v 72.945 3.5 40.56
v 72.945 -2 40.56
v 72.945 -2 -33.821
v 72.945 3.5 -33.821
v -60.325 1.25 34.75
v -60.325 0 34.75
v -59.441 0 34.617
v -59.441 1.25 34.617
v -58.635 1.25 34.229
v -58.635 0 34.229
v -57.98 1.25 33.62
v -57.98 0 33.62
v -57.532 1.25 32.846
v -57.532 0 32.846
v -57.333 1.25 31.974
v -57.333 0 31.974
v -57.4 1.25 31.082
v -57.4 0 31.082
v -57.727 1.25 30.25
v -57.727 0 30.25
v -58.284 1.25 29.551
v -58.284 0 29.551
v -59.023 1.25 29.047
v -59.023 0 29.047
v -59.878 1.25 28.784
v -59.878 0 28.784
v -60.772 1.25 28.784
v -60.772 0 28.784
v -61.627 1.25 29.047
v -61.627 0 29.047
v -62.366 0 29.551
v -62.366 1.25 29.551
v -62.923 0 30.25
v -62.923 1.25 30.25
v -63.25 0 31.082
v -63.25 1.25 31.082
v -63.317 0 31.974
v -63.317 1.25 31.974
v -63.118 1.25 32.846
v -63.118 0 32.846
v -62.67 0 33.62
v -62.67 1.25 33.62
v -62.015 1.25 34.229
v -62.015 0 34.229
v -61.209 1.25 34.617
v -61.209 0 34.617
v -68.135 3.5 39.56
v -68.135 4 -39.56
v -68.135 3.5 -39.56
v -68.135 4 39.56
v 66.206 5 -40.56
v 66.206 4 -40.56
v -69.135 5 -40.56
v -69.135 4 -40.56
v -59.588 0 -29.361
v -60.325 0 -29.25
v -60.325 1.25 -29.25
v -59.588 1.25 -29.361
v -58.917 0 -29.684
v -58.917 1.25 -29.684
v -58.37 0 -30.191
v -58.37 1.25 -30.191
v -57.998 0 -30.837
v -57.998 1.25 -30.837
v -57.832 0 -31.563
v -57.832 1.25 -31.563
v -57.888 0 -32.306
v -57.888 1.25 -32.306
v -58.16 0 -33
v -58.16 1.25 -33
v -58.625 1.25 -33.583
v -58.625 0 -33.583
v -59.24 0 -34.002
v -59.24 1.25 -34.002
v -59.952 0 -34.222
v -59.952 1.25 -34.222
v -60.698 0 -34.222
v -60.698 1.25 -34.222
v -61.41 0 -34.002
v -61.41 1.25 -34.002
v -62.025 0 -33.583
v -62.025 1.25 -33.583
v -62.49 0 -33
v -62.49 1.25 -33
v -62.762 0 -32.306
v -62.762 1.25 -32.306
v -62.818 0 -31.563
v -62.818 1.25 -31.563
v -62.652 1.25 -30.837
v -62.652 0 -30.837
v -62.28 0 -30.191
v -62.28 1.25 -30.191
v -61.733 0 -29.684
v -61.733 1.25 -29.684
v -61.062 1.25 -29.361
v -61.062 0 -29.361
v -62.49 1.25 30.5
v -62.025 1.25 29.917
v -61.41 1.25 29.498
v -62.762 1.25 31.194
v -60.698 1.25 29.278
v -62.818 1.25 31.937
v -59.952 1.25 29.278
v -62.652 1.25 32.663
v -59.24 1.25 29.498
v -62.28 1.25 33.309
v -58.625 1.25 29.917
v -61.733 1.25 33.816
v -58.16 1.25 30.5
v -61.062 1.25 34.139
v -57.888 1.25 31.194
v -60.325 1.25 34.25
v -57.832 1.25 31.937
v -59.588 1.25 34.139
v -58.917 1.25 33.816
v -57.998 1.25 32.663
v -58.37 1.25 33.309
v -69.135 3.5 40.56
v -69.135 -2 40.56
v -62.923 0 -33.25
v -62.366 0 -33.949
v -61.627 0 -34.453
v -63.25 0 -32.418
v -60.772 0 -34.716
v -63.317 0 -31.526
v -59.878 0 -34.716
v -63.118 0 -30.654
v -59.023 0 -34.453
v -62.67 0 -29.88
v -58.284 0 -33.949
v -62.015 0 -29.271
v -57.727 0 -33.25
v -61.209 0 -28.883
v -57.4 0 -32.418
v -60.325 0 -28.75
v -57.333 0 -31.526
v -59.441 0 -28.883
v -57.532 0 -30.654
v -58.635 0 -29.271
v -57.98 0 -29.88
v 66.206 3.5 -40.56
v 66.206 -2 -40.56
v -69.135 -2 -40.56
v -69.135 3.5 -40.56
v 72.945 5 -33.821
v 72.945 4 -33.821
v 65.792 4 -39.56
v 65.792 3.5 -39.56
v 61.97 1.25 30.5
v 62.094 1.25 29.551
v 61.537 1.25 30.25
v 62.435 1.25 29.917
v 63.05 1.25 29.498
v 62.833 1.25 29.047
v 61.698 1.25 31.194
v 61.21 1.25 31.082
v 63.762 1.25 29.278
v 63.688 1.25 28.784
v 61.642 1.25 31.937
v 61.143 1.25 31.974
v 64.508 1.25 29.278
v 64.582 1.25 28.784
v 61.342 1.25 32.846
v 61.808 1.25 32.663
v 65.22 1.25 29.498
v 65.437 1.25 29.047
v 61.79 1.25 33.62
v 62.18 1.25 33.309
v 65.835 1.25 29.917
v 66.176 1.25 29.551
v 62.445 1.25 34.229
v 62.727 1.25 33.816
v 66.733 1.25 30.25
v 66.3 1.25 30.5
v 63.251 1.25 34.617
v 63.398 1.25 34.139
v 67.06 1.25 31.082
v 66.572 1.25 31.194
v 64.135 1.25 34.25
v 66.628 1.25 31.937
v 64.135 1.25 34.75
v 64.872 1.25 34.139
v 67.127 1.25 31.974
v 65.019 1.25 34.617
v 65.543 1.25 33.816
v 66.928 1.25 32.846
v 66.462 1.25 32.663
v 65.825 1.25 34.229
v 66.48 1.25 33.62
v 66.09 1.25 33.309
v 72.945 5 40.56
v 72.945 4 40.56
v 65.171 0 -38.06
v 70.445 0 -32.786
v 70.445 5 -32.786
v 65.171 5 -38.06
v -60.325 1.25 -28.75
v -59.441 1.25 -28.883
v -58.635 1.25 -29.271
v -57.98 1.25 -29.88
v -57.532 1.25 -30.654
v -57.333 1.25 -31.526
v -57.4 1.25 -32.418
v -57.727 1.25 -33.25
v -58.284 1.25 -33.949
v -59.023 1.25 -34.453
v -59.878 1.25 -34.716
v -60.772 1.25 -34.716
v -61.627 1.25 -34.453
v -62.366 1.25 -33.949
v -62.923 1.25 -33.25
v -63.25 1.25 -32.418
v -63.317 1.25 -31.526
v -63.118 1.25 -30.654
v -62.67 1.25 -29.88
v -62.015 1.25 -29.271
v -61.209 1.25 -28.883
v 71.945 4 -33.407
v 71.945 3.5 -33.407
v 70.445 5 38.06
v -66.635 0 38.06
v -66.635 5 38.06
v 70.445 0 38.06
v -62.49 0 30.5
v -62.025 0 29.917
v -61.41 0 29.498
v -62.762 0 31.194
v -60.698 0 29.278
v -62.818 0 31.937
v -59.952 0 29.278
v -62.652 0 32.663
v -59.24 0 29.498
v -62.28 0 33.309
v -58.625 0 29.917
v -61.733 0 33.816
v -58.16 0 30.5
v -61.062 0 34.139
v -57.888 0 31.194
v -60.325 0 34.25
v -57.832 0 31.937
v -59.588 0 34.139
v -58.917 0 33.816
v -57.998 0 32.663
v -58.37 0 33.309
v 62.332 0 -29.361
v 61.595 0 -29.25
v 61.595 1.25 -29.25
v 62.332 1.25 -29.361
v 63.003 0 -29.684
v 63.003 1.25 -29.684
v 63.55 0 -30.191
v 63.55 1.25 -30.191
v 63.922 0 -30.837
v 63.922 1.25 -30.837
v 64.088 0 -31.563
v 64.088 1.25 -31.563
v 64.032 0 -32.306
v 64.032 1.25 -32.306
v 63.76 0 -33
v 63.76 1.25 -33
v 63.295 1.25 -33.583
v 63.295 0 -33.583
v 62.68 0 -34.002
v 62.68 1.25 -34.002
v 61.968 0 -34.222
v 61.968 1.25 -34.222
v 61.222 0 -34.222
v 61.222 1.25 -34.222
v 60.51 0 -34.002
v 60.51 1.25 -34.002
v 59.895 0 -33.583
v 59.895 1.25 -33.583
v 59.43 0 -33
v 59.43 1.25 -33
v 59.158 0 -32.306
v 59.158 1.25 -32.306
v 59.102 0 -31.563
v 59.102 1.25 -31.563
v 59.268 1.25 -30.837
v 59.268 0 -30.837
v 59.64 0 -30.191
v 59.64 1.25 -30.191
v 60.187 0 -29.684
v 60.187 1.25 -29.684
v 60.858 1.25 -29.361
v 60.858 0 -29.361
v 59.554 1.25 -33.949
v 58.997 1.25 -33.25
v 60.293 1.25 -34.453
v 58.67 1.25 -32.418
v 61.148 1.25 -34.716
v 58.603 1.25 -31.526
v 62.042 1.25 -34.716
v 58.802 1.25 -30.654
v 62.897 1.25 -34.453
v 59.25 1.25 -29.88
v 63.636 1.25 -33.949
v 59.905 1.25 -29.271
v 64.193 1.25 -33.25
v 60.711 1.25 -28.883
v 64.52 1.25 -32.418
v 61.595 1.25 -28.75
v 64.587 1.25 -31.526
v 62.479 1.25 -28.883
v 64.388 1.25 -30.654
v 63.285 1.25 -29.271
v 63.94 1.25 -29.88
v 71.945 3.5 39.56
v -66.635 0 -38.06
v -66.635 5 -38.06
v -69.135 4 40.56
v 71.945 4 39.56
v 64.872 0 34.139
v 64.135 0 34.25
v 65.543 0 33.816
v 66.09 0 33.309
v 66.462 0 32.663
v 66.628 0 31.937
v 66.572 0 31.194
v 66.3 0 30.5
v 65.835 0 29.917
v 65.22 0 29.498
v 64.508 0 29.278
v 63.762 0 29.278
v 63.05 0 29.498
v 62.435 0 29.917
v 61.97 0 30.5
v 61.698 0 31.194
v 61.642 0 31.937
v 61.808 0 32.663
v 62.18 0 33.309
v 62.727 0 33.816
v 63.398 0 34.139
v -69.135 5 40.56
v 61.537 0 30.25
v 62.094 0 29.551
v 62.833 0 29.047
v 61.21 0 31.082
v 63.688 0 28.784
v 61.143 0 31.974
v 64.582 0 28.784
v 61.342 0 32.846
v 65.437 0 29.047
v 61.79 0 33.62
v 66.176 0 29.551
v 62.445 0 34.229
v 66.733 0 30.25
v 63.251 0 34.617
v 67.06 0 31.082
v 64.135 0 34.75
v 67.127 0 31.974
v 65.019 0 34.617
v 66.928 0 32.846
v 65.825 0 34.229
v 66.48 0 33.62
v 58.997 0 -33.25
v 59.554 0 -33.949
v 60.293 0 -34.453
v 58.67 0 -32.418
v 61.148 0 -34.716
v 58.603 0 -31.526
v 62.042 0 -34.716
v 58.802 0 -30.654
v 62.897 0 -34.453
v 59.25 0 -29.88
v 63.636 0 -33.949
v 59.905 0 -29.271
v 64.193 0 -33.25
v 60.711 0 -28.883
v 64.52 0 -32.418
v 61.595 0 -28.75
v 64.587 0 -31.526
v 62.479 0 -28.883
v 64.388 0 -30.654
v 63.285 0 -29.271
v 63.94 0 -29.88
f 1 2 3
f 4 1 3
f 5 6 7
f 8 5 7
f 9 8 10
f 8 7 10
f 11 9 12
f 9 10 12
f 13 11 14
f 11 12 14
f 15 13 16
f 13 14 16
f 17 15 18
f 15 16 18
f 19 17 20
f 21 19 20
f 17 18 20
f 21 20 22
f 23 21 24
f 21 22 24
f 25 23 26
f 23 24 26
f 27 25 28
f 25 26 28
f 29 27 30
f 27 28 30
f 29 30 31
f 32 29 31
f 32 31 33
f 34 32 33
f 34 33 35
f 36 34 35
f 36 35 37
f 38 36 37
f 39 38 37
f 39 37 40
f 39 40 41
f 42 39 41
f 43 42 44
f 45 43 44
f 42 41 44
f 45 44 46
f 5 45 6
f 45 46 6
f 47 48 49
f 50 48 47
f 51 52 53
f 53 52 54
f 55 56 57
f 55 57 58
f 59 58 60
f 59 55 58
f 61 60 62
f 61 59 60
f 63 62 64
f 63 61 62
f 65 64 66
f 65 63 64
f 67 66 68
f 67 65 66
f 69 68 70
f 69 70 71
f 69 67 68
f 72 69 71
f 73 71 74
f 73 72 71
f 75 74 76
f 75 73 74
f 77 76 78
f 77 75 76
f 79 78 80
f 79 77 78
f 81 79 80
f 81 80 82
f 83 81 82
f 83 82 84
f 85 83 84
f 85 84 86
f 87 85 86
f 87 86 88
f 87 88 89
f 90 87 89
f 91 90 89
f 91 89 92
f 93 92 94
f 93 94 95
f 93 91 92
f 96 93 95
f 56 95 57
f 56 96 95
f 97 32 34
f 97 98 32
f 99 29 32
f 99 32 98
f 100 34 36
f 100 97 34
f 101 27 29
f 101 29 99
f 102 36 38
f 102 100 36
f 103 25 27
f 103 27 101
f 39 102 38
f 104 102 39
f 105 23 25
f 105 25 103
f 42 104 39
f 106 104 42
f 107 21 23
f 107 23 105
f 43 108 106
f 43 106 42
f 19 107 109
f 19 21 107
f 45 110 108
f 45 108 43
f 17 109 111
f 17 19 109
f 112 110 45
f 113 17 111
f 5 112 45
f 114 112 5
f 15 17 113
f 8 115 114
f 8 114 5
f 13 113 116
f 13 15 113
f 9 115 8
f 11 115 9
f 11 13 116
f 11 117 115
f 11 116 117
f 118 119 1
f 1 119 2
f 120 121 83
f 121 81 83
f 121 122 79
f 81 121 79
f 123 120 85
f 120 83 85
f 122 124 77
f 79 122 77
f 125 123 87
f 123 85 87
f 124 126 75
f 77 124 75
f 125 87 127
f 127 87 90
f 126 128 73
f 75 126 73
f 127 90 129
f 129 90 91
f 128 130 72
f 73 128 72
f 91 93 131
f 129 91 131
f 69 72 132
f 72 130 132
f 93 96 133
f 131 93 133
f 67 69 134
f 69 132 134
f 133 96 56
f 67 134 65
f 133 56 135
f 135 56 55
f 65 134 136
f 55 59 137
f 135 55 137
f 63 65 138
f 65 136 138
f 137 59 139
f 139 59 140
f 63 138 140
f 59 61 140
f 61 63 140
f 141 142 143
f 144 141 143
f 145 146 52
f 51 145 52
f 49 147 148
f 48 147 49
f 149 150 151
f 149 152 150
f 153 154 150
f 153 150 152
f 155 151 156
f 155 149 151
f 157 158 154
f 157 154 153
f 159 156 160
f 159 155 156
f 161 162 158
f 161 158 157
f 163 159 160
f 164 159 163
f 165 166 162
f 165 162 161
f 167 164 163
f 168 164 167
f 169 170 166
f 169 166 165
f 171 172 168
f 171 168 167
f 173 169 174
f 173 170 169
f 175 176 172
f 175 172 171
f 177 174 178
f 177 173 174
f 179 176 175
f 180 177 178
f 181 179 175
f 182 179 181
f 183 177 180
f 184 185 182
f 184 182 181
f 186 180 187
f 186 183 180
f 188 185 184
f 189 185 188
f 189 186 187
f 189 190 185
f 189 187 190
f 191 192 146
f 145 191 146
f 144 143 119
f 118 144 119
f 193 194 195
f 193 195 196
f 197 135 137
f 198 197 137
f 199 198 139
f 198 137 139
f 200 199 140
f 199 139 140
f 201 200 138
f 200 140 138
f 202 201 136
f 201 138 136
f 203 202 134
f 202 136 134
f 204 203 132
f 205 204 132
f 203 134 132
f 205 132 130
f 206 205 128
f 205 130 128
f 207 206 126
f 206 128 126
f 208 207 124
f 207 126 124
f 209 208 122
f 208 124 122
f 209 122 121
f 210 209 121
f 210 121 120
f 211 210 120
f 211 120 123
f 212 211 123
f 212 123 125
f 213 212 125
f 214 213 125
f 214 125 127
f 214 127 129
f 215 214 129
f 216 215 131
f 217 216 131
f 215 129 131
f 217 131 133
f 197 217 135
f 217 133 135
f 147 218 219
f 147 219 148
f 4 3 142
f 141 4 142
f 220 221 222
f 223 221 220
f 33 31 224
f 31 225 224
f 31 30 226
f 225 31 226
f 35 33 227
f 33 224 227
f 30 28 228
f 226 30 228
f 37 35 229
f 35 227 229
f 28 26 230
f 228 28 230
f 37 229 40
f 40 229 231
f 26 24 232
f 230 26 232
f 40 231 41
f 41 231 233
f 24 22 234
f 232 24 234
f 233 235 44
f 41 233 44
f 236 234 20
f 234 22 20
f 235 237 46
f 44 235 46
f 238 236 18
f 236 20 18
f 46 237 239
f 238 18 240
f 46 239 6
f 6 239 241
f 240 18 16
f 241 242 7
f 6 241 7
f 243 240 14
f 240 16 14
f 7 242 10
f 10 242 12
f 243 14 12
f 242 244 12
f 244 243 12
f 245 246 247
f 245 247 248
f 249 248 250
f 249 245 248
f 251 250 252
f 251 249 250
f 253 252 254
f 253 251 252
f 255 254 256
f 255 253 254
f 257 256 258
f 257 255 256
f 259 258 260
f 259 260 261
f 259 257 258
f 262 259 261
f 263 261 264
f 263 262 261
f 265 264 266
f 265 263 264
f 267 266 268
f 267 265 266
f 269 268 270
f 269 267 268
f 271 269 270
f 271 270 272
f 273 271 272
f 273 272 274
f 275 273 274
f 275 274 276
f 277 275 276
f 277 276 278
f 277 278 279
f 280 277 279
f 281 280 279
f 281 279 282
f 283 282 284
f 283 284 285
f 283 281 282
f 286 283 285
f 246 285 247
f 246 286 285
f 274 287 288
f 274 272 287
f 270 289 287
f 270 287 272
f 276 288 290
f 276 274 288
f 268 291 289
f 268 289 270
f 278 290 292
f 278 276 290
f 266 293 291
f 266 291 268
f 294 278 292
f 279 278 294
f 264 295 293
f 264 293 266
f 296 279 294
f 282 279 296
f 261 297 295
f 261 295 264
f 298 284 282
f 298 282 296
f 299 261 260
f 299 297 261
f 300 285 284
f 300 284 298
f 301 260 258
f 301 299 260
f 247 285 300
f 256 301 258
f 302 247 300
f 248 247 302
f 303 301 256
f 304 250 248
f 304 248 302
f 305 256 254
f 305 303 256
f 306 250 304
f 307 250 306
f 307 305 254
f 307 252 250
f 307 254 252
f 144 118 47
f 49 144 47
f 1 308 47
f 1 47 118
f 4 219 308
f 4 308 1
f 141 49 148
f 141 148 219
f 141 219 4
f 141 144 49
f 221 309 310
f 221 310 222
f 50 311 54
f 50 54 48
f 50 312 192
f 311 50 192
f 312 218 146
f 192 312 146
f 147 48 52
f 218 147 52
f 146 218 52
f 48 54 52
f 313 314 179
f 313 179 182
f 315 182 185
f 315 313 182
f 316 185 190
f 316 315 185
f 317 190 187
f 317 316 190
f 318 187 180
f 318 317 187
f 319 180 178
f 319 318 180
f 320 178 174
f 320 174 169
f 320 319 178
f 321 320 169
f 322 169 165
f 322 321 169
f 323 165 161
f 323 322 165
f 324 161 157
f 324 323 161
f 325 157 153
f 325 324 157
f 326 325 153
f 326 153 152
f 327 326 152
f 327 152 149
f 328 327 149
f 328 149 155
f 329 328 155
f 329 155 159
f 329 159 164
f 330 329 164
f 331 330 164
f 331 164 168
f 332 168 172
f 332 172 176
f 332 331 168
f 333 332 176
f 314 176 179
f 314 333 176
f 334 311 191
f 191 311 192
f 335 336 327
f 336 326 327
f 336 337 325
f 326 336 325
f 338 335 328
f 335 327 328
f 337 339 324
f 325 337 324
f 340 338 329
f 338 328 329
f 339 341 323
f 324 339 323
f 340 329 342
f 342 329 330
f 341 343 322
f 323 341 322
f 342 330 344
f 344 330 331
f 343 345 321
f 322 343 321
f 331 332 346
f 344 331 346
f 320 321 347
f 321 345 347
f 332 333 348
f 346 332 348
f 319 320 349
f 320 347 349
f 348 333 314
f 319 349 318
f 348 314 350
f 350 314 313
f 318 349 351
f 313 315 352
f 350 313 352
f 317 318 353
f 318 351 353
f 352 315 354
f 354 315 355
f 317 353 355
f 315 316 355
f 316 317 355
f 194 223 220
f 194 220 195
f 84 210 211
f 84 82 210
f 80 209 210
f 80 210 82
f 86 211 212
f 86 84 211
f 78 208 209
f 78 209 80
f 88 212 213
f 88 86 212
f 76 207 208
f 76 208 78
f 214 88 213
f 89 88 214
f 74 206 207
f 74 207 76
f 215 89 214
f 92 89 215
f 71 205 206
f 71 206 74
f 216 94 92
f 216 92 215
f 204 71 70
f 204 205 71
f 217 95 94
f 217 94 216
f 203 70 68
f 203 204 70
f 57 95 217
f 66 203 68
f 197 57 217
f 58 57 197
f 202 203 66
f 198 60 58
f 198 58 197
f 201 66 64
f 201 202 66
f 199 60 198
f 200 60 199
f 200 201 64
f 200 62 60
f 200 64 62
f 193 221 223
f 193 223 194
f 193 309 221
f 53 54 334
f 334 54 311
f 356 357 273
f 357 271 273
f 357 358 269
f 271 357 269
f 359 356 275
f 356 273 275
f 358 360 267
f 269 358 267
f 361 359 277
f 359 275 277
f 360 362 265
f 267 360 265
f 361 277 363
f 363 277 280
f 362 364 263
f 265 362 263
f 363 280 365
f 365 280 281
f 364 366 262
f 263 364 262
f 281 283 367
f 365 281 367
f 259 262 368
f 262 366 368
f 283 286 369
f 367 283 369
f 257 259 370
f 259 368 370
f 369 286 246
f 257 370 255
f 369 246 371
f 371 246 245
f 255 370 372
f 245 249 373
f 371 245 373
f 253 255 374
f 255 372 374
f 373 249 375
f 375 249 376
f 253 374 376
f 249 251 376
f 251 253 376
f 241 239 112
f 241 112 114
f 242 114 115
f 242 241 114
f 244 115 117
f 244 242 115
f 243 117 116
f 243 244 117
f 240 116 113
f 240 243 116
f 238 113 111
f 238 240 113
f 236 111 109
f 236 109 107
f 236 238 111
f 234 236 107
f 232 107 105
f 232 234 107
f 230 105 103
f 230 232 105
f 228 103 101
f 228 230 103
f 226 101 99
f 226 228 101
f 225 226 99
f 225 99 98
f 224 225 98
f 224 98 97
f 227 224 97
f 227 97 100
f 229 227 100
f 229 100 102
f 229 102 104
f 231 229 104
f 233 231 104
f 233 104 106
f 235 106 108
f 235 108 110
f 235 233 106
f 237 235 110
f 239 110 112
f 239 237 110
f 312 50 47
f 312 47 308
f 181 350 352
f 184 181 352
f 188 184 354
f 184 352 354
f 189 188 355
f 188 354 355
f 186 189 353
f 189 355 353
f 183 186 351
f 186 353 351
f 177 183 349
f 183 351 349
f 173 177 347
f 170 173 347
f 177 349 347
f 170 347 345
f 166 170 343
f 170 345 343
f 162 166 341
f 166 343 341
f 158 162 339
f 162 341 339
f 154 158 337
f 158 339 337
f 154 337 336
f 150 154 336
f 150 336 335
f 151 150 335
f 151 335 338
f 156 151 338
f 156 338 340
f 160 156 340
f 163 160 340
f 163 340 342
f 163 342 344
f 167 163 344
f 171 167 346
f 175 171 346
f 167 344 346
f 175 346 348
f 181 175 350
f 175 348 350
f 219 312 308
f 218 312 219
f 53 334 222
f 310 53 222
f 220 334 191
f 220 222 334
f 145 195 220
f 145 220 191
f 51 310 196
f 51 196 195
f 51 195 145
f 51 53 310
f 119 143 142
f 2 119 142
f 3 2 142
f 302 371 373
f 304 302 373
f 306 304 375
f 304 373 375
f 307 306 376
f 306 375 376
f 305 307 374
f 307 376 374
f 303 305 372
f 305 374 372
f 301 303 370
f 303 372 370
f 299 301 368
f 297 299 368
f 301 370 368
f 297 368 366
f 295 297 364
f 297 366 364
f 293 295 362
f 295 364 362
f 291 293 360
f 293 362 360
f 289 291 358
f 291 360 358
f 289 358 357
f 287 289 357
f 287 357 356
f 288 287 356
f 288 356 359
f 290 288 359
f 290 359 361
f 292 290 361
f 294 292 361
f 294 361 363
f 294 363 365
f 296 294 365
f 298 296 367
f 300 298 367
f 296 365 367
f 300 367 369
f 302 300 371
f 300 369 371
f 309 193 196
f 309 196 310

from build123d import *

# Parameters (mm, degrees)
BOSS_EXTRUDE1_DEPTH      = 5
BOSS_EXTRUDE1_DEPTH_BACK = 2
CUT_EXTRUDE1_DEPTH       = 5
SKETCH5_R                = 3
SKETCH5_R_2              = 2.5
BOSS_EXTRUDE2_DEPTH      = 1.25
BOSS_EXTRUDE2_2_DEPTH    = 1.25
BOSS_EXTRUDE2_3_DEPTH    = 1.25
BOSS_EXTRUDE2_4_DEPTH    = 1.25
CUT_EXTRUDE2_DEPTH       = 0.5


with BuildPart() as part:
    # Sketch3 → Boss-Extrude1 (new, two sides: drawn at the far end of the back side and taken through both)
    with BuildSketch(Plane(origin=(0, 0, 0), x_dir=(1, 0, 0), z_dir=(0, 1, 0)).offset(-BOSS_EXTRUDE1_DEPTH_BACK)):
        Polygon((72.945, 33.821067812), (66.206067812, 40.56), (-69.135, 40.56), (-69.135, -40.56), (72.945, -40.56), align=None)
    extrude(amount=BOSS_EXTRUDE1_DEPTH + BOSS_EXTRUDE1_DEPTH_BACK)

    # Sketch4 → Cut-Extrude1 (cut)
    with BuildSketch(Plane(origin=(0, 0, 0), x_dir=(1, 0, 0), z_dir=(0, 1, 0))):
        Polygon((-66.635, -38.06), (70.445, -38.06), (70.445, 32.785533906), (65.170533906, 38.06), (-66.635, 38.06), align=None)
    extrude(amount=CUT_EXTRUDE1_DEPTH, mode=Mode.SUBTRACT)

    # Sketch6 → Cut-Extrude2 (cut)
    with BuildSketch(Plane(origin=(0, 4, 0), x_dir=(1, 0, 0), z_dir=(0, 1, 0))):
        Polygon((-70.135, 41.56), (-70.135, -41.56), (73.945, -41.56), (73.945, 34.235281374), (66.620281374, 41.56), align=None)
        Polygon((-68.135, 39.56), (-68.135, -39.56), (71.945, -39.56), (71.945, 33.406854249), (65.791854249, 39.56), align=None, mode=Mode.SUBTRACT)
    extrude(amount=-CUT_EXTRUDE2_DEPTH, mode=Mode.SUBTRACT)


with BuildPart() as body_2:
    # Sketch5 → Boss-Extrude2 (new body)
    with BuildSketch(Plane(origin=(0, 0, 0), x_dir=(1, 0, 0), z_dir=(0, 1, 0))):
        with Locations(Location((-60.325, -31.75, 0), (0, 0, 270))):
            Circle(SKETCH5_R)
        with Locations(Location((-60.325, -31.75, 0), (0, 0, 270))):
            Circle(SKETCH5_R_2, mode=Mode.SUBTRACT)
    extrude(amount=BOSS_EXTRUDE2_DEPTH)


with BuildPart() as body_3:
    # Sketch5 → Boss-Extrude2 2 (new body)
    with BuildSketch(Plane(origin=(0, 0, 0), x_dir=(1, 0, 0), z_dir=(0, 1, 0))):
        with Locations(Location((-60.325, 31.75, 0), (0, 0, 270))):
            Circle(SKETCH5_R)
        with Locations(Location((-60.325, 31.75, 0), (0, 0, 270))):
            Circle(SKETCH5_R_2, mode=Mode.SUBTRACT)
    extrude(amount=BOSS_EXTRUDE2_2_DEPTH)


with BuildPart() as body_4:
    # Sketch5 → Boss-Extrude2 3 (new body)
    with BuildSketch(Plane(origin=(0, 0, 0), x_dir=(1, 0, 0), z_dir=(0, 1, 0))):
        with Locations(Location((61.595, 31.75, 0), (0, 0, 270))):
            Circle(SKETCH5_R)
        with Locations(Location((61.595, 31.75, 0), (0, 0, 270))):
            Circle(SKETCH5_R_2, mode=Mode.SUBTRACT)
    extrude(amount=BOSS_EXTRUDE2_3_DEPTH)


with BuildPart() as body_5:
    # Sketch5 → Boss-Extrude2 4 (new body)
    with BuildSketch(Plane(origin=(0, 0, 0), x_dir=(1, 0, 0), z_dir=(0, 1, 0))):
        with Locations(Location((64.135, -31.75, 0), (0, 0, 270))):
            Circle(SKETCH5_R)
        with Locations(Location((64.135, -31.75, 0), (0, 0, 270))):
            Circle(SKETCH5_R_2, mode=Mode.SUBTRACT)
    extrude(amount=BOSS_EXTRUDE2_4_DEPTH)


solid = Compound([part.part, body_2.part, body_3.part, body_4.part, body_5.part])
